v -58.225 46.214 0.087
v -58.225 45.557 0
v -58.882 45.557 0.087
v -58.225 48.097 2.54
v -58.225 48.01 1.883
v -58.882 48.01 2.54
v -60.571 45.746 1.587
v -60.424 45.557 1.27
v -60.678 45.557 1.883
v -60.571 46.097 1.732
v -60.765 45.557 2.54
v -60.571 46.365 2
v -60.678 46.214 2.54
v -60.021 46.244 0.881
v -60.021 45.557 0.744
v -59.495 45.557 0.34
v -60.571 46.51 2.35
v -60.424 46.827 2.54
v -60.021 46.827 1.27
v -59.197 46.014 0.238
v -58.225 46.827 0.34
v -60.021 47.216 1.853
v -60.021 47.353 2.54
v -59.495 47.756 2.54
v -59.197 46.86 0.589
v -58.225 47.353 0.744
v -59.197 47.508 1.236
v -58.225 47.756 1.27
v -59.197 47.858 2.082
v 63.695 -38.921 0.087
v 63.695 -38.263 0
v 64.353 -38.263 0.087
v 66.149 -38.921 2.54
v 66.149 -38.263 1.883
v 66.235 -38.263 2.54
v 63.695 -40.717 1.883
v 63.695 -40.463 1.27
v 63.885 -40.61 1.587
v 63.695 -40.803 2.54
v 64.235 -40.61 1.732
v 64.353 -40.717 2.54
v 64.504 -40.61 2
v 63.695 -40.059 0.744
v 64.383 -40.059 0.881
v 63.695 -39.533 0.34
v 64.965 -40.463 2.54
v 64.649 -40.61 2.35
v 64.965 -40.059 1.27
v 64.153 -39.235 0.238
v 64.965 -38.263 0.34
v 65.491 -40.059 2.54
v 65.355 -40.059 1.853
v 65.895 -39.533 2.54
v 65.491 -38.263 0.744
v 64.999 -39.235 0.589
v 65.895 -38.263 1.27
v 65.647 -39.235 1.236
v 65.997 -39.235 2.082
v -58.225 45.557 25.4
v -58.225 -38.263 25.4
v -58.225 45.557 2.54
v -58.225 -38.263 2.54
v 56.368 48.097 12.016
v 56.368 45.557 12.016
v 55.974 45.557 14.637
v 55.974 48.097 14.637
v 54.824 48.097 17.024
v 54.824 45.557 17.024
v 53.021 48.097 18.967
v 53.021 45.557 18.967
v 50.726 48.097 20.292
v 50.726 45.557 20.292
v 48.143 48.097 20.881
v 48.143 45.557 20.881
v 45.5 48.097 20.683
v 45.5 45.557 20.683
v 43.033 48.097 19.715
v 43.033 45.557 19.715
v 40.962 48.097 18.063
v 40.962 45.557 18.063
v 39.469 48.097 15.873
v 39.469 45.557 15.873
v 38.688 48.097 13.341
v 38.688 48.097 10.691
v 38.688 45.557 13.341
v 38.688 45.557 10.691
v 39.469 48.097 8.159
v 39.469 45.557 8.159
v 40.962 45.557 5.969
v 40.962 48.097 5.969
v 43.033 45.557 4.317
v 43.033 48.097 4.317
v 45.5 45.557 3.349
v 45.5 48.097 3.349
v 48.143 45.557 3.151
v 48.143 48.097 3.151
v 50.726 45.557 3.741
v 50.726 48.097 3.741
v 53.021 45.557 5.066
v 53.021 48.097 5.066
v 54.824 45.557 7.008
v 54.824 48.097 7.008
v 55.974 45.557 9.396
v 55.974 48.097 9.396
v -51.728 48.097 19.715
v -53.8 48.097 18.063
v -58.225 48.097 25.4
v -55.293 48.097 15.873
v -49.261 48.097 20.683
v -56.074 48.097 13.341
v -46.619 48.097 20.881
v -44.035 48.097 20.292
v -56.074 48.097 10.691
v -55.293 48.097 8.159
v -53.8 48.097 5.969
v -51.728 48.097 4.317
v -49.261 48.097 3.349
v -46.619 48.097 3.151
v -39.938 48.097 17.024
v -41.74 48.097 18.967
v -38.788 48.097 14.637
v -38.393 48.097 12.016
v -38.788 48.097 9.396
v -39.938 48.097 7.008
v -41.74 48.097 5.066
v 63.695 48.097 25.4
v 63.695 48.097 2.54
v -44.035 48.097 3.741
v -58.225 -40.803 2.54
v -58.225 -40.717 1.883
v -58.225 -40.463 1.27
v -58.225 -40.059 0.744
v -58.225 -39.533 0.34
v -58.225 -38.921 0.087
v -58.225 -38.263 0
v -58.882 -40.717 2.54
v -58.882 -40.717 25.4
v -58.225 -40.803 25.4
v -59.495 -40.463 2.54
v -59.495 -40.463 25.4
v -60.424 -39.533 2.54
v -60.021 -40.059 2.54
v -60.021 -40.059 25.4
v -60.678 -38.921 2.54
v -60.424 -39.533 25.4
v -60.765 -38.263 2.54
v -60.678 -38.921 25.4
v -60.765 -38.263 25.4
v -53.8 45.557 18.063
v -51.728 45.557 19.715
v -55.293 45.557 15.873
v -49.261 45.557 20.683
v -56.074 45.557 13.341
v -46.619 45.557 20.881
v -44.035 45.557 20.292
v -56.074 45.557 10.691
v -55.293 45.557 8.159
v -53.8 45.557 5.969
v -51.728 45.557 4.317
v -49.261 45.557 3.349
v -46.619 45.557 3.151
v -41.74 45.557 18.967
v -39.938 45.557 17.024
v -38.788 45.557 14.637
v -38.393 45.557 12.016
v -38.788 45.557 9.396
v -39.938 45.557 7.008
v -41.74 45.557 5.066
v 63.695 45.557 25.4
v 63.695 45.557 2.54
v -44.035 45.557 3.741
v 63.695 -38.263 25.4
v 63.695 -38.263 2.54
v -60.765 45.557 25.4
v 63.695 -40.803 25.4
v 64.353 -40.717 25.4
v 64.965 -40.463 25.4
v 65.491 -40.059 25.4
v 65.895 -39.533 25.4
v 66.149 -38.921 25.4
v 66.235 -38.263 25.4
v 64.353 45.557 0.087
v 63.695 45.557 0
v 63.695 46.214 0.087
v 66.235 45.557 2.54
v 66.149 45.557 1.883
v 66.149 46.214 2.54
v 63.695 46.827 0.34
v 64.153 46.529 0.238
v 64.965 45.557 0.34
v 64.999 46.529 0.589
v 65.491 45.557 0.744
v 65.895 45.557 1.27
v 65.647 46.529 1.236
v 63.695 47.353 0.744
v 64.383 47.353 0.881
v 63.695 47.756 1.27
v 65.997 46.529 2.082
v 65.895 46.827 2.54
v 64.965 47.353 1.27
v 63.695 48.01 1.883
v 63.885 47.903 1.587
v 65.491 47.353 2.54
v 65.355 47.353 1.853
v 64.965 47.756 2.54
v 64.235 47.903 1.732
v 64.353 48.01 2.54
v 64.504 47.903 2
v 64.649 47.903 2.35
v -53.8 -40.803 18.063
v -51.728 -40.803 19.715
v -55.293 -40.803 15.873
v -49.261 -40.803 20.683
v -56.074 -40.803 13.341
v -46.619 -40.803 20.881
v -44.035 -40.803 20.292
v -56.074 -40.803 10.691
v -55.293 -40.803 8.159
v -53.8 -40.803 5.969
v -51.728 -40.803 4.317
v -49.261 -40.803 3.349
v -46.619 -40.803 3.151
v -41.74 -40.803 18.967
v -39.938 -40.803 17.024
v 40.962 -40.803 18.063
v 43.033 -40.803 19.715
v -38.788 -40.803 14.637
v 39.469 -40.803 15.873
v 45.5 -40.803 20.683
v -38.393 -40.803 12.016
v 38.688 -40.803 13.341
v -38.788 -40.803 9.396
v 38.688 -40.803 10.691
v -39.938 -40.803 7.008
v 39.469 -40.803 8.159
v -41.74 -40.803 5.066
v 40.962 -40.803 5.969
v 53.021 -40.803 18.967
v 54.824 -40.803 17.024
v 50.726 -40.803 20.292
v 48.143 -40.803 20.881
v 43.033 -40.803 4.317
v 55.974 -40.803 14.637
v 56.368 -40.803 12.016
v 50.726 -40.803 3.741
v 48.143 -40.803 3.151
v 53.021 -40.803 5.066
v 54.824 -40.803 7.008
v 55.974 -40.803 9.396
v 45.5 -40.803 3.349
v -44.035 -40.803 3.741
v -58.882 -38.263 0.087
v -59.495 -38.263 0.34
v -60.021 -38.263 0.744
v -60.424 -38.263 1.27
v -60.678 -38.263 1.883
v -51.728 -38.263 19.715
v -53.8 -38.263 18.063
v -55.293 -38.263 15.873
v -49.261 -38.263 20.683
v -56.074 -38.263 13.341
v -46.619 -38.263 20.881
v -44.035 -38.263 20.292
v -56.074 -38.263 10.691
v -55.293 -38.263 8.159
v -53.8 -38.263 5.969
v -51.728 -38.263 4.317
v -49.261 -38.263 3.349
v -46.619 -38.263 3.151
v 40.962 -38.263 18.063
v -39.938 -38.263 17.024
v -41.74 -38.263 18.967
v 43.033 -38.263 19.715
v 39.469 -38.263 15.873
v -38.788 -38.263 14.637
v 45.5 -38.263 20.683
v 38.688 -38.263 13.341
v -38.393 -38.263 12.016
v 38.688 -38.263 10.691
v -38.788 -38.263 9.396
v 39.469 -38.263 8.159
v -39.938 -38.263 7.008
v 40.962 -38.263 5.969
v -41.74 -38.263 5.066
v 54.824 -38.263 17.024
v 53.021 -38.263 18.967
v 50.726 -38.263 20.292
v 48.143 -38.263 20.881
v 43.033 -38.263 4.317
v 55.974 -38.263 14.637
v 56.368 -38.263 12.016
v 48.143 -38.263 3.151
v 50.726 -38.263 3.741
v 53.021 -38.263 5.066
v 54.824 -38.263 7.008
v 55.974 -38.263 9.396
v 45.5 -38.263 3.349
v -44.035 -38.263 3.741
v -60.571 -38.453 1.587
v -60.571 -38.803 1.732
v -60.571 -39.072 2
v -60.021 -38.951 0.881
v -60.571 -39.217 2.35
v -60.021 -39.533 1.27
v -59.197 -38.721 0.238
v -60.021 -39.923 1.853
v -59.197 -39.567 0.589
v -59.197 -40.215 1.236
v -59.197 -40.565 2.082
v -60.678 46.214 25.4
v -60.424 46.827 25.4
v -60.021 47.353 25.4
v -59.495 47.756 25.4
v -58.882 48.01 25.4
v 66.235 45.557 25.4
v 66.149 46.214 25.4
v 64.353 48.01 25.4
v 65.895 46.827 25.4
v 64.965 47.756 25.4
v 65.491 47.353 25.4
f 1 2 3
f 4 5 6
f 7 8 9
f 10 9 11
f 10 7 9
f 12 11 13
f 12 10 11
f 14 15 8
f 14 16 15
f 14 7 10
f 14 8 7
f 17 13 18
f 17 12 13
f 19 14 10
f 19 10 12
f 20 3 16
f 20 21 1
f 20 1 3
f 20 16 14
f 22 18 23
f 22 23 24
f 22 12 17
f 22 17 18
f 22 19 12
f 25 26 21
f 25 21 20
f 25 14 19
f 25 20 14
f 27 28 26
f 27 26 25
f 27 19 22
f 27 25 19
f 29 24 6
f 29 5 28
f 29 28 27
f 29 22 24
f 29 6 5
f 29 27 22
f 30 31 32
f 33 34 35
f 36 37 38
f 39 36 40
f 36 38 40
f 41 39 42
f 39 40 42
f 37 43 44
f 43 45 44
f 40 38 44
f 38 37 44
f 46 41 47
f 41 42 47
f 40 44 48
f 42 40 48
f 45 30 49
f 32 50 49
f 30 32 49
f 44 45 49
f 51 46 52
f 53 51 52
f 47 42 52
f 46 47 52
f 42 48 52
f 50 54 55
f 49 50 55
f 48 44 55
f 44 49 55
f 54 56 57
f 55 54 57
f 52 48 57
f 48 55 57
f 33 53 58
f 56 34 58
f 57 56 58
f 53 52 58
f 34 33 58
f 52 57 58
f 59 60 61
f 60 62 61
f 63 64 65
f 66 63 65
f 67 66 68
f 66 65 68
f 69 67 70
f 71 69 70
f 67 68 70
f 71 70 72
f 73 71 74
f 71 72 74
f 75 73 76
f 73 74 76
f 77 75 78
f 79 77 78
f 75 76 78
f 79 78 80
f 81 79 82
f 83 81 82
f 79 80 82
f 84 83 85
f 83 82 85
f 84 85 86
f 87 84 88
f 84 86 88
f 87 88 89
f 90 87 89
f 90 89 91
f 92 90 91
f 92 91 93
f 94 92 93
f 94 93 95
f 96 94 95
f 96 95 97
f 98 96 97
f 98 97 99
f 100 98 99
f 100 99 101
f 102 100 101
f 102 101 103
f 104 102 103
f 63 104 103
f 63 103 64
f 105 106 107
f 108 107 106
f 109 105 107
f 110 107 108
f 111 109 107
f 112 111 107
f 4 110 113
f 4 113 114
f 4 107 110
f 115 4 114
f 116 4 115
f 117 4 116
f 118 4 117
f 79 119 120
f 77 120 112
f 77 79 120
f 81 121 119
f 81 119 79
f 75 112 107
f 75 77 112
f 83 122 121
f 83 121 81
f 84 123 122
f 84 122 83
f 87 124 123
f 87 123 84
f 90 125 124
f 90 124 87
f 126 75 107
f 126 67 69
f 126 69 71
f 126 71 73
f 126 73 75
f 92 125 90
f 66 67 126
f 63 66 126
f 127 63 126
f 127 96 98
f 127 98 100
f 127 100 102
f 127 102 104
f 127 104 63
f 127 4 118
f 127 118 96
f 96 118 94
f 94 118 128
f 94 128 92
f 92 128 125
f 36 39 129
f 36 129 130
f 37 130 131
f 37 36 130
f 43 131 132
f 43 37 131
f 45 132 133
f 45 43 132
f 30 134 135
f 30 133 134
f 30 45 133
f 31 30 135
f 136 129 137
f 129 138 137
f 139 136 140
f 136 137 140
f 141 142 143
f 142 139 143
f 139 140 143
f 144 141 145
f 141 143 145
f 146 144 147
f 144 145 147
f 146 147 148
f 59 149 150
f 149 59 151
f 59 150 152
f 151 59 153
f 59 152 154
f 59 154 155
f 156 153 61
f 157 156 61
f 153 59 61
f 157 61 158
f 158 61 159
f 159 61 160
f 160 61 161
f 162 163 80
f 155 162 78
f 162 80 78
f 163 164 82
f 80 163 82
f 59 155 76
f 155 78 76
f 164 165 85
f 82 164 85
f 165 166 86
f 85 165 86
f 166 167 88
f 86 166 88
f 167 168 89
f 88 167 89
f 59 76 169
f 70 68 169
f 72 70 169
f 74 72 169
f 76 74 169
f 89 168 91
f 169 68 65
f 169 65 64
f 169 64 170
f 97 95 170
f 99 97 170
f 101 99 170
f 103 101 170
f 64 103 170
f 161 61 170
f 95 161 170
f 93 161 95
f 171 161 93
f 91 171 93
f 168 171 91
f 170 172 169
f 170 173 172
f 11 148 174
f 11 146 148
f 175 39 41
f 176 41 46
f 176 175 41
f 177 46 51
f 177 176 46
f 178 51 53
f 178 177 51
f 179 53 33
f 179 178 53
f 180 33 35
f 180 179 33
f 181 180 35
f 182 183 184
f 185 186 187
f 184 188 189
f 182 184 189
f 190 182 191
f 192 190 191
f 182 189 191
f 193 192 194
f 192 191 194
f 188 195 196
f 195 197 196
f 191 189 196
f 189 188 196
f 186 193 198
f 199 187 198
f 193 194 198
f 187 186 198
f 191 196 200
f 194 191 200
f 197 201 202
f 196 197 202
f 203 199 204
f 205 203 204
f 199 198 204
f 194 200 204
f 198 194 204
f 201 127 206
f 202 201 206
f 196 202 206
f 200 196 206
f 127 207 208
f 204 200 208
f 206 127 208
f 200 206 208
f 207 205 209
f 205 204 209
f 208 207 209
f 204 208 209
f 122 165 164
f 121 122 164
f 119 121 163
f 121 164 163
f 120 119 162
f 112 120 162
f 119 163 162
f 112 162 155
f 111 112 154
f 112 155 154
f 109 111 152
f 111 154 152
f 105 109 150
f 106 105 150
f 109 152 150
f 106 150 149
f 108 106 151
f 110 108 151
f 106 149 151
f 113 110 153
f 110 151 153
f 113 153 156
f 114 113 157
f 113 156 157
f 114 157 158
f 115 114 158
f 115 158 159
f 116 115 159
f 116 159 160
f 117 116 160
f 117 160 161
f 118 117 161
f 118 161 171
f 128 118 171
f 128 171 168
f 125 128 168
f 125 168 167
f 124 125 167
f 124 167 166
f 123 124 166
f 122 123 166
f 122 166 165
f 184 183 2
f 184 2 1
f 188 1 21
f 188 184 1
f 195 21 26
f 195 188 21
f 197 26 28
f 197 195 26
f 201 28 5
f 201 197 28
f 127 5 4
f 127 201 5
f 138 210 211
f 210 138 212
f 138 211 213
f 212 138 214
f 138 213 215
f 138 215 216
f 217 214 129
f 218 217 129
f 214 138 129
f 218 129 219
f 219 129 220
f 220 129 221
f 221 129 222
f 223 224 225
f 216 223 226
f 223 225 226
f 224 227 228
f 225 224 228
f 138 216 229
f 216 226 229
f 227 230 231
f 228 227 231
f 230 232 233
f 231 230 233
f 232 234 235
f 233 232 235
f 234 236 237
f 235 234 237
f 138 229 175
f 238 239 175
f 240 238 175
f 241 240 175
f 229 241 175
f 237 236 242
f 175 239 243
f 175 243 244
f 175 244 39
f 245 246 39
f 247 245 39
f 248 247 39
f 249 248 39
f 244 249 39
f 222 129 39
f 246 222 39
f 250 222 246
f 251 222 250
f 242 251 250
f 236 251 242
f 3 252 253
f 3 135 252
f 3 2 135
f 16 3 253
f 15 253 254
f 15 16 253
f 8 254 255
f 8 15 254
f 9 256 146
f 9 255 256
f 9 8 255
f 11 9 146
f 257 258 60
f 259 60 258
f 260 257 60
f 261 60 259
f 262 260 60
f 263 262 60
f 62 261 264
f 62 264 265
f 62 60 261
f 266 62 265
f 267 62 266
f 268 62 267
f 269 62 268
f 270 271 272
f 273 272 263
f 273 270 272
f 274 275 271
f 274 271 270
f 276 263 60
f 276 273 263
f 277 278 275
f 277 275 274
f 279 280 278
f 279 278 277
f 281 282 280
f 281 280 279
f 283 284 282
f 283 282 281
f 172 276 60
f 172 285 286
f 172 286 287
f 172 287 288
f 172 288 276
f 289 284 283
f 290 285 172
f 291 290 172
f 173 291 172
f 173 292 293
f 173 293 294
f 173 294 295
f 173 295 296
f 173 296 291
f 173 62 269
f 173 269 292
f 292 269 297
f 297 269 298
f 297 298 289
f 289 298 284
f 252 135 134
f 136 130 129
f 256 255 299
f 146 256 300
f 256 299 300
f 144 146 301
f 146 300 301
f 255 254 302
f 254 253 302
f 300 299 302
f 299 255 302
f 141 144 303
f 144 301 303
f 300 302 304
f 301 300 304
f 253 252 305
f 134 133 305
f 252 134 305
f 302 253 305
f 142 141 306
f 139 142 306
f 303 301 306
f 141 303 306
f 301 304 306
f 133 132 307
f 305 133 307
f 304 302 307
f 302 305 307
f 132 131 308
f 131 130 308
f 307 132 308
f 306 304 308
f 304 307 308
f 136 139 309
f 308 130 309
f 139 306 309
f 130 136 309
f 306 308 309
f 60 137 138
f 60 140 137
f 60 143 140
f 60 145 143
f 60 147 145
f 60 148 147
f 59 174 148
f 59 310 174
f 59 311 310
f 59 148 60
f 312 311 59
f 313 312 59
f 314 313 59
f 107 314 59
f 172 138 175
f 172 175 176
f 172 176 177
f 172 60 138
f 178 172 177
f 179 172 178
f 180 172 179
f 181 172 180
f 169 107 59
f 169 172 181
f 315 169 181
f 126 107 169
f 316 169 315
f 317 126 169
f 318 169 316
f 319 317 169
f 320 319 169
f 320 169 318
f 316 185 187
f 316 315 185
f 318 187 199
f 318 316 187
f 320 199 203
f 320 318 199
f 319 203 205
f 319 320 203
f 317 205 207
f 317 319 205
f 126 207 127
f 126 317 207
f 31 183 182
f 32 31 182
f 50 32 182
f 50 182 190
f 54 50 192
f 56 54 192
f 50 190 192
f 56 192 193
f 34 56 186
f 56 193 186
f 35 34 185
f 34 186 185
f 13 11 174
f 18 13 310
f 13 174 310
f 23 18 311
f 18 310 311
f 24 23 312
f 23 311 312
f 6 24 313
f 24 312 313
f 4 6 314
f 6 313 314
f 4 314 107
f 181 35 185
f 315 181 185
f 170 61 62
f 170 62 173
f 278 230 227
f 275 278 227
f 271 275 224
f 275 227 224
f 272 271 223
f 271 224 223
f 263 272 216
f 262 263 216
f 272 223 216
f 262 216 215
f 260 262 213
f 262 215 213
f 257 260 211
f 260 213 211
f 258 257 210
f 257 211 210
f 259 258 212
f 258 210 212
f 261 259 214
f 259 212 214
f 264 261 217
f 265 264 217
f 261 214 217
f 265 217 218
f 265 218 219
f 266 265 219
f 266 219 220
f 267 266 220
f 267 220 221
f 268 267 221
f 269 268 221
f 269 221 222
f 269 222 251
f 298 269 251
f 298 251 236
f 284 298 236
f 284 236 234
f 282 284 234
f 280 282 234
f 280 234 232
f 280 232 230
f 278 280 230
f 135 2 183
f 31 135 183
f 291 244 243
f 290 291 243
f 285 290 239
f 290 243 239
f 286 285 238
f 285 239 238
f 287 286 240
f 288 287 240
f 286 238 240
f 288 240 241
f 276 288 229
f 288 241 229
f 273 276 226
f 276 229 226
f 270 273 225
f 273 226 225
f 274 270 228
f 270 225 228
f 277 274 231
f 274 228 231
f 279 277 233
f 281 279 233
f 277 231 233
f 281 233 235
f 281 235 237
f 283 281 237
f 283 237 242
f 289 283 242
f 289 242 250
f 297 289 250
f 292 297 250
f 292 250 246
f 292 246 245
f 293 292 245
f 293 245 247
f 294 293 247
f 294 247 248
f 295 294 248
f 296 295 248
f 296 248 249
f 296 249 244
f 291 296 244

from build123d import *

# Parameters (mm, degrees)
F0_W     = 127
F0_H     = 88.9
F1_DEPTH = 25.4
F2_T     = -2.54
F3_R     = 8.89
F4_DEPTH = 1270
F5_R     = 2.54
F6_R     = 2.54


with BuildPart() as f1:
    # F0 (on Top) → F1 (new body)
    with BuildSketch(Plane.XY):
        with Locations((2.735384, 3.646639)):
            Rectangle(F0_W, F0_H)
    extrude(amount=F1_DEPTH)

    # F2
    f2_openings = [f1.faces().sort_by_distance(p)[0] for p in [
        (2.735384, 3.646639, 25.4),
    ]]
    offset(amount=F2_T, openings=f2_openings)

    # F3 (on face) → F4 (cut)
    with BuildSketch(Plane.XZ.offset(40.803361)):
        with Locations((-47.283076, 12.016155)):
            Circle(F3_R)
        with Locations((47.478464, 12.016155)):
            Circle(F3_R)
    extrude(amount=-F4_DEPTH, mode=Mode.SUBTRACT)

    # F5
    f5_edges = [f1.edges().sort_by_distance(p)[0] for p in [
        (66.235384, 3.646639, 0),
    ]]
    fillet(f5_edges, radius=F5_R)

    # F6
    f6_edges = [f1.edges().sort_by_distance(p)[0] for p in [
        (1.465384, -40.803361, 0),
        (66.235384, -40.803361, 13.97),
        (66.235384, 48.096639, 13.97),
        (1.465384, 48.096639, 0),
        (-60.764616, 3.646639, 0),
        (-60.764616, 48.096639, 12.7),
        (-60.764616, -40.803361, 12.7),
    ]]
    fillet(f6_edges, radius=F6_R)


solid = f1.part
